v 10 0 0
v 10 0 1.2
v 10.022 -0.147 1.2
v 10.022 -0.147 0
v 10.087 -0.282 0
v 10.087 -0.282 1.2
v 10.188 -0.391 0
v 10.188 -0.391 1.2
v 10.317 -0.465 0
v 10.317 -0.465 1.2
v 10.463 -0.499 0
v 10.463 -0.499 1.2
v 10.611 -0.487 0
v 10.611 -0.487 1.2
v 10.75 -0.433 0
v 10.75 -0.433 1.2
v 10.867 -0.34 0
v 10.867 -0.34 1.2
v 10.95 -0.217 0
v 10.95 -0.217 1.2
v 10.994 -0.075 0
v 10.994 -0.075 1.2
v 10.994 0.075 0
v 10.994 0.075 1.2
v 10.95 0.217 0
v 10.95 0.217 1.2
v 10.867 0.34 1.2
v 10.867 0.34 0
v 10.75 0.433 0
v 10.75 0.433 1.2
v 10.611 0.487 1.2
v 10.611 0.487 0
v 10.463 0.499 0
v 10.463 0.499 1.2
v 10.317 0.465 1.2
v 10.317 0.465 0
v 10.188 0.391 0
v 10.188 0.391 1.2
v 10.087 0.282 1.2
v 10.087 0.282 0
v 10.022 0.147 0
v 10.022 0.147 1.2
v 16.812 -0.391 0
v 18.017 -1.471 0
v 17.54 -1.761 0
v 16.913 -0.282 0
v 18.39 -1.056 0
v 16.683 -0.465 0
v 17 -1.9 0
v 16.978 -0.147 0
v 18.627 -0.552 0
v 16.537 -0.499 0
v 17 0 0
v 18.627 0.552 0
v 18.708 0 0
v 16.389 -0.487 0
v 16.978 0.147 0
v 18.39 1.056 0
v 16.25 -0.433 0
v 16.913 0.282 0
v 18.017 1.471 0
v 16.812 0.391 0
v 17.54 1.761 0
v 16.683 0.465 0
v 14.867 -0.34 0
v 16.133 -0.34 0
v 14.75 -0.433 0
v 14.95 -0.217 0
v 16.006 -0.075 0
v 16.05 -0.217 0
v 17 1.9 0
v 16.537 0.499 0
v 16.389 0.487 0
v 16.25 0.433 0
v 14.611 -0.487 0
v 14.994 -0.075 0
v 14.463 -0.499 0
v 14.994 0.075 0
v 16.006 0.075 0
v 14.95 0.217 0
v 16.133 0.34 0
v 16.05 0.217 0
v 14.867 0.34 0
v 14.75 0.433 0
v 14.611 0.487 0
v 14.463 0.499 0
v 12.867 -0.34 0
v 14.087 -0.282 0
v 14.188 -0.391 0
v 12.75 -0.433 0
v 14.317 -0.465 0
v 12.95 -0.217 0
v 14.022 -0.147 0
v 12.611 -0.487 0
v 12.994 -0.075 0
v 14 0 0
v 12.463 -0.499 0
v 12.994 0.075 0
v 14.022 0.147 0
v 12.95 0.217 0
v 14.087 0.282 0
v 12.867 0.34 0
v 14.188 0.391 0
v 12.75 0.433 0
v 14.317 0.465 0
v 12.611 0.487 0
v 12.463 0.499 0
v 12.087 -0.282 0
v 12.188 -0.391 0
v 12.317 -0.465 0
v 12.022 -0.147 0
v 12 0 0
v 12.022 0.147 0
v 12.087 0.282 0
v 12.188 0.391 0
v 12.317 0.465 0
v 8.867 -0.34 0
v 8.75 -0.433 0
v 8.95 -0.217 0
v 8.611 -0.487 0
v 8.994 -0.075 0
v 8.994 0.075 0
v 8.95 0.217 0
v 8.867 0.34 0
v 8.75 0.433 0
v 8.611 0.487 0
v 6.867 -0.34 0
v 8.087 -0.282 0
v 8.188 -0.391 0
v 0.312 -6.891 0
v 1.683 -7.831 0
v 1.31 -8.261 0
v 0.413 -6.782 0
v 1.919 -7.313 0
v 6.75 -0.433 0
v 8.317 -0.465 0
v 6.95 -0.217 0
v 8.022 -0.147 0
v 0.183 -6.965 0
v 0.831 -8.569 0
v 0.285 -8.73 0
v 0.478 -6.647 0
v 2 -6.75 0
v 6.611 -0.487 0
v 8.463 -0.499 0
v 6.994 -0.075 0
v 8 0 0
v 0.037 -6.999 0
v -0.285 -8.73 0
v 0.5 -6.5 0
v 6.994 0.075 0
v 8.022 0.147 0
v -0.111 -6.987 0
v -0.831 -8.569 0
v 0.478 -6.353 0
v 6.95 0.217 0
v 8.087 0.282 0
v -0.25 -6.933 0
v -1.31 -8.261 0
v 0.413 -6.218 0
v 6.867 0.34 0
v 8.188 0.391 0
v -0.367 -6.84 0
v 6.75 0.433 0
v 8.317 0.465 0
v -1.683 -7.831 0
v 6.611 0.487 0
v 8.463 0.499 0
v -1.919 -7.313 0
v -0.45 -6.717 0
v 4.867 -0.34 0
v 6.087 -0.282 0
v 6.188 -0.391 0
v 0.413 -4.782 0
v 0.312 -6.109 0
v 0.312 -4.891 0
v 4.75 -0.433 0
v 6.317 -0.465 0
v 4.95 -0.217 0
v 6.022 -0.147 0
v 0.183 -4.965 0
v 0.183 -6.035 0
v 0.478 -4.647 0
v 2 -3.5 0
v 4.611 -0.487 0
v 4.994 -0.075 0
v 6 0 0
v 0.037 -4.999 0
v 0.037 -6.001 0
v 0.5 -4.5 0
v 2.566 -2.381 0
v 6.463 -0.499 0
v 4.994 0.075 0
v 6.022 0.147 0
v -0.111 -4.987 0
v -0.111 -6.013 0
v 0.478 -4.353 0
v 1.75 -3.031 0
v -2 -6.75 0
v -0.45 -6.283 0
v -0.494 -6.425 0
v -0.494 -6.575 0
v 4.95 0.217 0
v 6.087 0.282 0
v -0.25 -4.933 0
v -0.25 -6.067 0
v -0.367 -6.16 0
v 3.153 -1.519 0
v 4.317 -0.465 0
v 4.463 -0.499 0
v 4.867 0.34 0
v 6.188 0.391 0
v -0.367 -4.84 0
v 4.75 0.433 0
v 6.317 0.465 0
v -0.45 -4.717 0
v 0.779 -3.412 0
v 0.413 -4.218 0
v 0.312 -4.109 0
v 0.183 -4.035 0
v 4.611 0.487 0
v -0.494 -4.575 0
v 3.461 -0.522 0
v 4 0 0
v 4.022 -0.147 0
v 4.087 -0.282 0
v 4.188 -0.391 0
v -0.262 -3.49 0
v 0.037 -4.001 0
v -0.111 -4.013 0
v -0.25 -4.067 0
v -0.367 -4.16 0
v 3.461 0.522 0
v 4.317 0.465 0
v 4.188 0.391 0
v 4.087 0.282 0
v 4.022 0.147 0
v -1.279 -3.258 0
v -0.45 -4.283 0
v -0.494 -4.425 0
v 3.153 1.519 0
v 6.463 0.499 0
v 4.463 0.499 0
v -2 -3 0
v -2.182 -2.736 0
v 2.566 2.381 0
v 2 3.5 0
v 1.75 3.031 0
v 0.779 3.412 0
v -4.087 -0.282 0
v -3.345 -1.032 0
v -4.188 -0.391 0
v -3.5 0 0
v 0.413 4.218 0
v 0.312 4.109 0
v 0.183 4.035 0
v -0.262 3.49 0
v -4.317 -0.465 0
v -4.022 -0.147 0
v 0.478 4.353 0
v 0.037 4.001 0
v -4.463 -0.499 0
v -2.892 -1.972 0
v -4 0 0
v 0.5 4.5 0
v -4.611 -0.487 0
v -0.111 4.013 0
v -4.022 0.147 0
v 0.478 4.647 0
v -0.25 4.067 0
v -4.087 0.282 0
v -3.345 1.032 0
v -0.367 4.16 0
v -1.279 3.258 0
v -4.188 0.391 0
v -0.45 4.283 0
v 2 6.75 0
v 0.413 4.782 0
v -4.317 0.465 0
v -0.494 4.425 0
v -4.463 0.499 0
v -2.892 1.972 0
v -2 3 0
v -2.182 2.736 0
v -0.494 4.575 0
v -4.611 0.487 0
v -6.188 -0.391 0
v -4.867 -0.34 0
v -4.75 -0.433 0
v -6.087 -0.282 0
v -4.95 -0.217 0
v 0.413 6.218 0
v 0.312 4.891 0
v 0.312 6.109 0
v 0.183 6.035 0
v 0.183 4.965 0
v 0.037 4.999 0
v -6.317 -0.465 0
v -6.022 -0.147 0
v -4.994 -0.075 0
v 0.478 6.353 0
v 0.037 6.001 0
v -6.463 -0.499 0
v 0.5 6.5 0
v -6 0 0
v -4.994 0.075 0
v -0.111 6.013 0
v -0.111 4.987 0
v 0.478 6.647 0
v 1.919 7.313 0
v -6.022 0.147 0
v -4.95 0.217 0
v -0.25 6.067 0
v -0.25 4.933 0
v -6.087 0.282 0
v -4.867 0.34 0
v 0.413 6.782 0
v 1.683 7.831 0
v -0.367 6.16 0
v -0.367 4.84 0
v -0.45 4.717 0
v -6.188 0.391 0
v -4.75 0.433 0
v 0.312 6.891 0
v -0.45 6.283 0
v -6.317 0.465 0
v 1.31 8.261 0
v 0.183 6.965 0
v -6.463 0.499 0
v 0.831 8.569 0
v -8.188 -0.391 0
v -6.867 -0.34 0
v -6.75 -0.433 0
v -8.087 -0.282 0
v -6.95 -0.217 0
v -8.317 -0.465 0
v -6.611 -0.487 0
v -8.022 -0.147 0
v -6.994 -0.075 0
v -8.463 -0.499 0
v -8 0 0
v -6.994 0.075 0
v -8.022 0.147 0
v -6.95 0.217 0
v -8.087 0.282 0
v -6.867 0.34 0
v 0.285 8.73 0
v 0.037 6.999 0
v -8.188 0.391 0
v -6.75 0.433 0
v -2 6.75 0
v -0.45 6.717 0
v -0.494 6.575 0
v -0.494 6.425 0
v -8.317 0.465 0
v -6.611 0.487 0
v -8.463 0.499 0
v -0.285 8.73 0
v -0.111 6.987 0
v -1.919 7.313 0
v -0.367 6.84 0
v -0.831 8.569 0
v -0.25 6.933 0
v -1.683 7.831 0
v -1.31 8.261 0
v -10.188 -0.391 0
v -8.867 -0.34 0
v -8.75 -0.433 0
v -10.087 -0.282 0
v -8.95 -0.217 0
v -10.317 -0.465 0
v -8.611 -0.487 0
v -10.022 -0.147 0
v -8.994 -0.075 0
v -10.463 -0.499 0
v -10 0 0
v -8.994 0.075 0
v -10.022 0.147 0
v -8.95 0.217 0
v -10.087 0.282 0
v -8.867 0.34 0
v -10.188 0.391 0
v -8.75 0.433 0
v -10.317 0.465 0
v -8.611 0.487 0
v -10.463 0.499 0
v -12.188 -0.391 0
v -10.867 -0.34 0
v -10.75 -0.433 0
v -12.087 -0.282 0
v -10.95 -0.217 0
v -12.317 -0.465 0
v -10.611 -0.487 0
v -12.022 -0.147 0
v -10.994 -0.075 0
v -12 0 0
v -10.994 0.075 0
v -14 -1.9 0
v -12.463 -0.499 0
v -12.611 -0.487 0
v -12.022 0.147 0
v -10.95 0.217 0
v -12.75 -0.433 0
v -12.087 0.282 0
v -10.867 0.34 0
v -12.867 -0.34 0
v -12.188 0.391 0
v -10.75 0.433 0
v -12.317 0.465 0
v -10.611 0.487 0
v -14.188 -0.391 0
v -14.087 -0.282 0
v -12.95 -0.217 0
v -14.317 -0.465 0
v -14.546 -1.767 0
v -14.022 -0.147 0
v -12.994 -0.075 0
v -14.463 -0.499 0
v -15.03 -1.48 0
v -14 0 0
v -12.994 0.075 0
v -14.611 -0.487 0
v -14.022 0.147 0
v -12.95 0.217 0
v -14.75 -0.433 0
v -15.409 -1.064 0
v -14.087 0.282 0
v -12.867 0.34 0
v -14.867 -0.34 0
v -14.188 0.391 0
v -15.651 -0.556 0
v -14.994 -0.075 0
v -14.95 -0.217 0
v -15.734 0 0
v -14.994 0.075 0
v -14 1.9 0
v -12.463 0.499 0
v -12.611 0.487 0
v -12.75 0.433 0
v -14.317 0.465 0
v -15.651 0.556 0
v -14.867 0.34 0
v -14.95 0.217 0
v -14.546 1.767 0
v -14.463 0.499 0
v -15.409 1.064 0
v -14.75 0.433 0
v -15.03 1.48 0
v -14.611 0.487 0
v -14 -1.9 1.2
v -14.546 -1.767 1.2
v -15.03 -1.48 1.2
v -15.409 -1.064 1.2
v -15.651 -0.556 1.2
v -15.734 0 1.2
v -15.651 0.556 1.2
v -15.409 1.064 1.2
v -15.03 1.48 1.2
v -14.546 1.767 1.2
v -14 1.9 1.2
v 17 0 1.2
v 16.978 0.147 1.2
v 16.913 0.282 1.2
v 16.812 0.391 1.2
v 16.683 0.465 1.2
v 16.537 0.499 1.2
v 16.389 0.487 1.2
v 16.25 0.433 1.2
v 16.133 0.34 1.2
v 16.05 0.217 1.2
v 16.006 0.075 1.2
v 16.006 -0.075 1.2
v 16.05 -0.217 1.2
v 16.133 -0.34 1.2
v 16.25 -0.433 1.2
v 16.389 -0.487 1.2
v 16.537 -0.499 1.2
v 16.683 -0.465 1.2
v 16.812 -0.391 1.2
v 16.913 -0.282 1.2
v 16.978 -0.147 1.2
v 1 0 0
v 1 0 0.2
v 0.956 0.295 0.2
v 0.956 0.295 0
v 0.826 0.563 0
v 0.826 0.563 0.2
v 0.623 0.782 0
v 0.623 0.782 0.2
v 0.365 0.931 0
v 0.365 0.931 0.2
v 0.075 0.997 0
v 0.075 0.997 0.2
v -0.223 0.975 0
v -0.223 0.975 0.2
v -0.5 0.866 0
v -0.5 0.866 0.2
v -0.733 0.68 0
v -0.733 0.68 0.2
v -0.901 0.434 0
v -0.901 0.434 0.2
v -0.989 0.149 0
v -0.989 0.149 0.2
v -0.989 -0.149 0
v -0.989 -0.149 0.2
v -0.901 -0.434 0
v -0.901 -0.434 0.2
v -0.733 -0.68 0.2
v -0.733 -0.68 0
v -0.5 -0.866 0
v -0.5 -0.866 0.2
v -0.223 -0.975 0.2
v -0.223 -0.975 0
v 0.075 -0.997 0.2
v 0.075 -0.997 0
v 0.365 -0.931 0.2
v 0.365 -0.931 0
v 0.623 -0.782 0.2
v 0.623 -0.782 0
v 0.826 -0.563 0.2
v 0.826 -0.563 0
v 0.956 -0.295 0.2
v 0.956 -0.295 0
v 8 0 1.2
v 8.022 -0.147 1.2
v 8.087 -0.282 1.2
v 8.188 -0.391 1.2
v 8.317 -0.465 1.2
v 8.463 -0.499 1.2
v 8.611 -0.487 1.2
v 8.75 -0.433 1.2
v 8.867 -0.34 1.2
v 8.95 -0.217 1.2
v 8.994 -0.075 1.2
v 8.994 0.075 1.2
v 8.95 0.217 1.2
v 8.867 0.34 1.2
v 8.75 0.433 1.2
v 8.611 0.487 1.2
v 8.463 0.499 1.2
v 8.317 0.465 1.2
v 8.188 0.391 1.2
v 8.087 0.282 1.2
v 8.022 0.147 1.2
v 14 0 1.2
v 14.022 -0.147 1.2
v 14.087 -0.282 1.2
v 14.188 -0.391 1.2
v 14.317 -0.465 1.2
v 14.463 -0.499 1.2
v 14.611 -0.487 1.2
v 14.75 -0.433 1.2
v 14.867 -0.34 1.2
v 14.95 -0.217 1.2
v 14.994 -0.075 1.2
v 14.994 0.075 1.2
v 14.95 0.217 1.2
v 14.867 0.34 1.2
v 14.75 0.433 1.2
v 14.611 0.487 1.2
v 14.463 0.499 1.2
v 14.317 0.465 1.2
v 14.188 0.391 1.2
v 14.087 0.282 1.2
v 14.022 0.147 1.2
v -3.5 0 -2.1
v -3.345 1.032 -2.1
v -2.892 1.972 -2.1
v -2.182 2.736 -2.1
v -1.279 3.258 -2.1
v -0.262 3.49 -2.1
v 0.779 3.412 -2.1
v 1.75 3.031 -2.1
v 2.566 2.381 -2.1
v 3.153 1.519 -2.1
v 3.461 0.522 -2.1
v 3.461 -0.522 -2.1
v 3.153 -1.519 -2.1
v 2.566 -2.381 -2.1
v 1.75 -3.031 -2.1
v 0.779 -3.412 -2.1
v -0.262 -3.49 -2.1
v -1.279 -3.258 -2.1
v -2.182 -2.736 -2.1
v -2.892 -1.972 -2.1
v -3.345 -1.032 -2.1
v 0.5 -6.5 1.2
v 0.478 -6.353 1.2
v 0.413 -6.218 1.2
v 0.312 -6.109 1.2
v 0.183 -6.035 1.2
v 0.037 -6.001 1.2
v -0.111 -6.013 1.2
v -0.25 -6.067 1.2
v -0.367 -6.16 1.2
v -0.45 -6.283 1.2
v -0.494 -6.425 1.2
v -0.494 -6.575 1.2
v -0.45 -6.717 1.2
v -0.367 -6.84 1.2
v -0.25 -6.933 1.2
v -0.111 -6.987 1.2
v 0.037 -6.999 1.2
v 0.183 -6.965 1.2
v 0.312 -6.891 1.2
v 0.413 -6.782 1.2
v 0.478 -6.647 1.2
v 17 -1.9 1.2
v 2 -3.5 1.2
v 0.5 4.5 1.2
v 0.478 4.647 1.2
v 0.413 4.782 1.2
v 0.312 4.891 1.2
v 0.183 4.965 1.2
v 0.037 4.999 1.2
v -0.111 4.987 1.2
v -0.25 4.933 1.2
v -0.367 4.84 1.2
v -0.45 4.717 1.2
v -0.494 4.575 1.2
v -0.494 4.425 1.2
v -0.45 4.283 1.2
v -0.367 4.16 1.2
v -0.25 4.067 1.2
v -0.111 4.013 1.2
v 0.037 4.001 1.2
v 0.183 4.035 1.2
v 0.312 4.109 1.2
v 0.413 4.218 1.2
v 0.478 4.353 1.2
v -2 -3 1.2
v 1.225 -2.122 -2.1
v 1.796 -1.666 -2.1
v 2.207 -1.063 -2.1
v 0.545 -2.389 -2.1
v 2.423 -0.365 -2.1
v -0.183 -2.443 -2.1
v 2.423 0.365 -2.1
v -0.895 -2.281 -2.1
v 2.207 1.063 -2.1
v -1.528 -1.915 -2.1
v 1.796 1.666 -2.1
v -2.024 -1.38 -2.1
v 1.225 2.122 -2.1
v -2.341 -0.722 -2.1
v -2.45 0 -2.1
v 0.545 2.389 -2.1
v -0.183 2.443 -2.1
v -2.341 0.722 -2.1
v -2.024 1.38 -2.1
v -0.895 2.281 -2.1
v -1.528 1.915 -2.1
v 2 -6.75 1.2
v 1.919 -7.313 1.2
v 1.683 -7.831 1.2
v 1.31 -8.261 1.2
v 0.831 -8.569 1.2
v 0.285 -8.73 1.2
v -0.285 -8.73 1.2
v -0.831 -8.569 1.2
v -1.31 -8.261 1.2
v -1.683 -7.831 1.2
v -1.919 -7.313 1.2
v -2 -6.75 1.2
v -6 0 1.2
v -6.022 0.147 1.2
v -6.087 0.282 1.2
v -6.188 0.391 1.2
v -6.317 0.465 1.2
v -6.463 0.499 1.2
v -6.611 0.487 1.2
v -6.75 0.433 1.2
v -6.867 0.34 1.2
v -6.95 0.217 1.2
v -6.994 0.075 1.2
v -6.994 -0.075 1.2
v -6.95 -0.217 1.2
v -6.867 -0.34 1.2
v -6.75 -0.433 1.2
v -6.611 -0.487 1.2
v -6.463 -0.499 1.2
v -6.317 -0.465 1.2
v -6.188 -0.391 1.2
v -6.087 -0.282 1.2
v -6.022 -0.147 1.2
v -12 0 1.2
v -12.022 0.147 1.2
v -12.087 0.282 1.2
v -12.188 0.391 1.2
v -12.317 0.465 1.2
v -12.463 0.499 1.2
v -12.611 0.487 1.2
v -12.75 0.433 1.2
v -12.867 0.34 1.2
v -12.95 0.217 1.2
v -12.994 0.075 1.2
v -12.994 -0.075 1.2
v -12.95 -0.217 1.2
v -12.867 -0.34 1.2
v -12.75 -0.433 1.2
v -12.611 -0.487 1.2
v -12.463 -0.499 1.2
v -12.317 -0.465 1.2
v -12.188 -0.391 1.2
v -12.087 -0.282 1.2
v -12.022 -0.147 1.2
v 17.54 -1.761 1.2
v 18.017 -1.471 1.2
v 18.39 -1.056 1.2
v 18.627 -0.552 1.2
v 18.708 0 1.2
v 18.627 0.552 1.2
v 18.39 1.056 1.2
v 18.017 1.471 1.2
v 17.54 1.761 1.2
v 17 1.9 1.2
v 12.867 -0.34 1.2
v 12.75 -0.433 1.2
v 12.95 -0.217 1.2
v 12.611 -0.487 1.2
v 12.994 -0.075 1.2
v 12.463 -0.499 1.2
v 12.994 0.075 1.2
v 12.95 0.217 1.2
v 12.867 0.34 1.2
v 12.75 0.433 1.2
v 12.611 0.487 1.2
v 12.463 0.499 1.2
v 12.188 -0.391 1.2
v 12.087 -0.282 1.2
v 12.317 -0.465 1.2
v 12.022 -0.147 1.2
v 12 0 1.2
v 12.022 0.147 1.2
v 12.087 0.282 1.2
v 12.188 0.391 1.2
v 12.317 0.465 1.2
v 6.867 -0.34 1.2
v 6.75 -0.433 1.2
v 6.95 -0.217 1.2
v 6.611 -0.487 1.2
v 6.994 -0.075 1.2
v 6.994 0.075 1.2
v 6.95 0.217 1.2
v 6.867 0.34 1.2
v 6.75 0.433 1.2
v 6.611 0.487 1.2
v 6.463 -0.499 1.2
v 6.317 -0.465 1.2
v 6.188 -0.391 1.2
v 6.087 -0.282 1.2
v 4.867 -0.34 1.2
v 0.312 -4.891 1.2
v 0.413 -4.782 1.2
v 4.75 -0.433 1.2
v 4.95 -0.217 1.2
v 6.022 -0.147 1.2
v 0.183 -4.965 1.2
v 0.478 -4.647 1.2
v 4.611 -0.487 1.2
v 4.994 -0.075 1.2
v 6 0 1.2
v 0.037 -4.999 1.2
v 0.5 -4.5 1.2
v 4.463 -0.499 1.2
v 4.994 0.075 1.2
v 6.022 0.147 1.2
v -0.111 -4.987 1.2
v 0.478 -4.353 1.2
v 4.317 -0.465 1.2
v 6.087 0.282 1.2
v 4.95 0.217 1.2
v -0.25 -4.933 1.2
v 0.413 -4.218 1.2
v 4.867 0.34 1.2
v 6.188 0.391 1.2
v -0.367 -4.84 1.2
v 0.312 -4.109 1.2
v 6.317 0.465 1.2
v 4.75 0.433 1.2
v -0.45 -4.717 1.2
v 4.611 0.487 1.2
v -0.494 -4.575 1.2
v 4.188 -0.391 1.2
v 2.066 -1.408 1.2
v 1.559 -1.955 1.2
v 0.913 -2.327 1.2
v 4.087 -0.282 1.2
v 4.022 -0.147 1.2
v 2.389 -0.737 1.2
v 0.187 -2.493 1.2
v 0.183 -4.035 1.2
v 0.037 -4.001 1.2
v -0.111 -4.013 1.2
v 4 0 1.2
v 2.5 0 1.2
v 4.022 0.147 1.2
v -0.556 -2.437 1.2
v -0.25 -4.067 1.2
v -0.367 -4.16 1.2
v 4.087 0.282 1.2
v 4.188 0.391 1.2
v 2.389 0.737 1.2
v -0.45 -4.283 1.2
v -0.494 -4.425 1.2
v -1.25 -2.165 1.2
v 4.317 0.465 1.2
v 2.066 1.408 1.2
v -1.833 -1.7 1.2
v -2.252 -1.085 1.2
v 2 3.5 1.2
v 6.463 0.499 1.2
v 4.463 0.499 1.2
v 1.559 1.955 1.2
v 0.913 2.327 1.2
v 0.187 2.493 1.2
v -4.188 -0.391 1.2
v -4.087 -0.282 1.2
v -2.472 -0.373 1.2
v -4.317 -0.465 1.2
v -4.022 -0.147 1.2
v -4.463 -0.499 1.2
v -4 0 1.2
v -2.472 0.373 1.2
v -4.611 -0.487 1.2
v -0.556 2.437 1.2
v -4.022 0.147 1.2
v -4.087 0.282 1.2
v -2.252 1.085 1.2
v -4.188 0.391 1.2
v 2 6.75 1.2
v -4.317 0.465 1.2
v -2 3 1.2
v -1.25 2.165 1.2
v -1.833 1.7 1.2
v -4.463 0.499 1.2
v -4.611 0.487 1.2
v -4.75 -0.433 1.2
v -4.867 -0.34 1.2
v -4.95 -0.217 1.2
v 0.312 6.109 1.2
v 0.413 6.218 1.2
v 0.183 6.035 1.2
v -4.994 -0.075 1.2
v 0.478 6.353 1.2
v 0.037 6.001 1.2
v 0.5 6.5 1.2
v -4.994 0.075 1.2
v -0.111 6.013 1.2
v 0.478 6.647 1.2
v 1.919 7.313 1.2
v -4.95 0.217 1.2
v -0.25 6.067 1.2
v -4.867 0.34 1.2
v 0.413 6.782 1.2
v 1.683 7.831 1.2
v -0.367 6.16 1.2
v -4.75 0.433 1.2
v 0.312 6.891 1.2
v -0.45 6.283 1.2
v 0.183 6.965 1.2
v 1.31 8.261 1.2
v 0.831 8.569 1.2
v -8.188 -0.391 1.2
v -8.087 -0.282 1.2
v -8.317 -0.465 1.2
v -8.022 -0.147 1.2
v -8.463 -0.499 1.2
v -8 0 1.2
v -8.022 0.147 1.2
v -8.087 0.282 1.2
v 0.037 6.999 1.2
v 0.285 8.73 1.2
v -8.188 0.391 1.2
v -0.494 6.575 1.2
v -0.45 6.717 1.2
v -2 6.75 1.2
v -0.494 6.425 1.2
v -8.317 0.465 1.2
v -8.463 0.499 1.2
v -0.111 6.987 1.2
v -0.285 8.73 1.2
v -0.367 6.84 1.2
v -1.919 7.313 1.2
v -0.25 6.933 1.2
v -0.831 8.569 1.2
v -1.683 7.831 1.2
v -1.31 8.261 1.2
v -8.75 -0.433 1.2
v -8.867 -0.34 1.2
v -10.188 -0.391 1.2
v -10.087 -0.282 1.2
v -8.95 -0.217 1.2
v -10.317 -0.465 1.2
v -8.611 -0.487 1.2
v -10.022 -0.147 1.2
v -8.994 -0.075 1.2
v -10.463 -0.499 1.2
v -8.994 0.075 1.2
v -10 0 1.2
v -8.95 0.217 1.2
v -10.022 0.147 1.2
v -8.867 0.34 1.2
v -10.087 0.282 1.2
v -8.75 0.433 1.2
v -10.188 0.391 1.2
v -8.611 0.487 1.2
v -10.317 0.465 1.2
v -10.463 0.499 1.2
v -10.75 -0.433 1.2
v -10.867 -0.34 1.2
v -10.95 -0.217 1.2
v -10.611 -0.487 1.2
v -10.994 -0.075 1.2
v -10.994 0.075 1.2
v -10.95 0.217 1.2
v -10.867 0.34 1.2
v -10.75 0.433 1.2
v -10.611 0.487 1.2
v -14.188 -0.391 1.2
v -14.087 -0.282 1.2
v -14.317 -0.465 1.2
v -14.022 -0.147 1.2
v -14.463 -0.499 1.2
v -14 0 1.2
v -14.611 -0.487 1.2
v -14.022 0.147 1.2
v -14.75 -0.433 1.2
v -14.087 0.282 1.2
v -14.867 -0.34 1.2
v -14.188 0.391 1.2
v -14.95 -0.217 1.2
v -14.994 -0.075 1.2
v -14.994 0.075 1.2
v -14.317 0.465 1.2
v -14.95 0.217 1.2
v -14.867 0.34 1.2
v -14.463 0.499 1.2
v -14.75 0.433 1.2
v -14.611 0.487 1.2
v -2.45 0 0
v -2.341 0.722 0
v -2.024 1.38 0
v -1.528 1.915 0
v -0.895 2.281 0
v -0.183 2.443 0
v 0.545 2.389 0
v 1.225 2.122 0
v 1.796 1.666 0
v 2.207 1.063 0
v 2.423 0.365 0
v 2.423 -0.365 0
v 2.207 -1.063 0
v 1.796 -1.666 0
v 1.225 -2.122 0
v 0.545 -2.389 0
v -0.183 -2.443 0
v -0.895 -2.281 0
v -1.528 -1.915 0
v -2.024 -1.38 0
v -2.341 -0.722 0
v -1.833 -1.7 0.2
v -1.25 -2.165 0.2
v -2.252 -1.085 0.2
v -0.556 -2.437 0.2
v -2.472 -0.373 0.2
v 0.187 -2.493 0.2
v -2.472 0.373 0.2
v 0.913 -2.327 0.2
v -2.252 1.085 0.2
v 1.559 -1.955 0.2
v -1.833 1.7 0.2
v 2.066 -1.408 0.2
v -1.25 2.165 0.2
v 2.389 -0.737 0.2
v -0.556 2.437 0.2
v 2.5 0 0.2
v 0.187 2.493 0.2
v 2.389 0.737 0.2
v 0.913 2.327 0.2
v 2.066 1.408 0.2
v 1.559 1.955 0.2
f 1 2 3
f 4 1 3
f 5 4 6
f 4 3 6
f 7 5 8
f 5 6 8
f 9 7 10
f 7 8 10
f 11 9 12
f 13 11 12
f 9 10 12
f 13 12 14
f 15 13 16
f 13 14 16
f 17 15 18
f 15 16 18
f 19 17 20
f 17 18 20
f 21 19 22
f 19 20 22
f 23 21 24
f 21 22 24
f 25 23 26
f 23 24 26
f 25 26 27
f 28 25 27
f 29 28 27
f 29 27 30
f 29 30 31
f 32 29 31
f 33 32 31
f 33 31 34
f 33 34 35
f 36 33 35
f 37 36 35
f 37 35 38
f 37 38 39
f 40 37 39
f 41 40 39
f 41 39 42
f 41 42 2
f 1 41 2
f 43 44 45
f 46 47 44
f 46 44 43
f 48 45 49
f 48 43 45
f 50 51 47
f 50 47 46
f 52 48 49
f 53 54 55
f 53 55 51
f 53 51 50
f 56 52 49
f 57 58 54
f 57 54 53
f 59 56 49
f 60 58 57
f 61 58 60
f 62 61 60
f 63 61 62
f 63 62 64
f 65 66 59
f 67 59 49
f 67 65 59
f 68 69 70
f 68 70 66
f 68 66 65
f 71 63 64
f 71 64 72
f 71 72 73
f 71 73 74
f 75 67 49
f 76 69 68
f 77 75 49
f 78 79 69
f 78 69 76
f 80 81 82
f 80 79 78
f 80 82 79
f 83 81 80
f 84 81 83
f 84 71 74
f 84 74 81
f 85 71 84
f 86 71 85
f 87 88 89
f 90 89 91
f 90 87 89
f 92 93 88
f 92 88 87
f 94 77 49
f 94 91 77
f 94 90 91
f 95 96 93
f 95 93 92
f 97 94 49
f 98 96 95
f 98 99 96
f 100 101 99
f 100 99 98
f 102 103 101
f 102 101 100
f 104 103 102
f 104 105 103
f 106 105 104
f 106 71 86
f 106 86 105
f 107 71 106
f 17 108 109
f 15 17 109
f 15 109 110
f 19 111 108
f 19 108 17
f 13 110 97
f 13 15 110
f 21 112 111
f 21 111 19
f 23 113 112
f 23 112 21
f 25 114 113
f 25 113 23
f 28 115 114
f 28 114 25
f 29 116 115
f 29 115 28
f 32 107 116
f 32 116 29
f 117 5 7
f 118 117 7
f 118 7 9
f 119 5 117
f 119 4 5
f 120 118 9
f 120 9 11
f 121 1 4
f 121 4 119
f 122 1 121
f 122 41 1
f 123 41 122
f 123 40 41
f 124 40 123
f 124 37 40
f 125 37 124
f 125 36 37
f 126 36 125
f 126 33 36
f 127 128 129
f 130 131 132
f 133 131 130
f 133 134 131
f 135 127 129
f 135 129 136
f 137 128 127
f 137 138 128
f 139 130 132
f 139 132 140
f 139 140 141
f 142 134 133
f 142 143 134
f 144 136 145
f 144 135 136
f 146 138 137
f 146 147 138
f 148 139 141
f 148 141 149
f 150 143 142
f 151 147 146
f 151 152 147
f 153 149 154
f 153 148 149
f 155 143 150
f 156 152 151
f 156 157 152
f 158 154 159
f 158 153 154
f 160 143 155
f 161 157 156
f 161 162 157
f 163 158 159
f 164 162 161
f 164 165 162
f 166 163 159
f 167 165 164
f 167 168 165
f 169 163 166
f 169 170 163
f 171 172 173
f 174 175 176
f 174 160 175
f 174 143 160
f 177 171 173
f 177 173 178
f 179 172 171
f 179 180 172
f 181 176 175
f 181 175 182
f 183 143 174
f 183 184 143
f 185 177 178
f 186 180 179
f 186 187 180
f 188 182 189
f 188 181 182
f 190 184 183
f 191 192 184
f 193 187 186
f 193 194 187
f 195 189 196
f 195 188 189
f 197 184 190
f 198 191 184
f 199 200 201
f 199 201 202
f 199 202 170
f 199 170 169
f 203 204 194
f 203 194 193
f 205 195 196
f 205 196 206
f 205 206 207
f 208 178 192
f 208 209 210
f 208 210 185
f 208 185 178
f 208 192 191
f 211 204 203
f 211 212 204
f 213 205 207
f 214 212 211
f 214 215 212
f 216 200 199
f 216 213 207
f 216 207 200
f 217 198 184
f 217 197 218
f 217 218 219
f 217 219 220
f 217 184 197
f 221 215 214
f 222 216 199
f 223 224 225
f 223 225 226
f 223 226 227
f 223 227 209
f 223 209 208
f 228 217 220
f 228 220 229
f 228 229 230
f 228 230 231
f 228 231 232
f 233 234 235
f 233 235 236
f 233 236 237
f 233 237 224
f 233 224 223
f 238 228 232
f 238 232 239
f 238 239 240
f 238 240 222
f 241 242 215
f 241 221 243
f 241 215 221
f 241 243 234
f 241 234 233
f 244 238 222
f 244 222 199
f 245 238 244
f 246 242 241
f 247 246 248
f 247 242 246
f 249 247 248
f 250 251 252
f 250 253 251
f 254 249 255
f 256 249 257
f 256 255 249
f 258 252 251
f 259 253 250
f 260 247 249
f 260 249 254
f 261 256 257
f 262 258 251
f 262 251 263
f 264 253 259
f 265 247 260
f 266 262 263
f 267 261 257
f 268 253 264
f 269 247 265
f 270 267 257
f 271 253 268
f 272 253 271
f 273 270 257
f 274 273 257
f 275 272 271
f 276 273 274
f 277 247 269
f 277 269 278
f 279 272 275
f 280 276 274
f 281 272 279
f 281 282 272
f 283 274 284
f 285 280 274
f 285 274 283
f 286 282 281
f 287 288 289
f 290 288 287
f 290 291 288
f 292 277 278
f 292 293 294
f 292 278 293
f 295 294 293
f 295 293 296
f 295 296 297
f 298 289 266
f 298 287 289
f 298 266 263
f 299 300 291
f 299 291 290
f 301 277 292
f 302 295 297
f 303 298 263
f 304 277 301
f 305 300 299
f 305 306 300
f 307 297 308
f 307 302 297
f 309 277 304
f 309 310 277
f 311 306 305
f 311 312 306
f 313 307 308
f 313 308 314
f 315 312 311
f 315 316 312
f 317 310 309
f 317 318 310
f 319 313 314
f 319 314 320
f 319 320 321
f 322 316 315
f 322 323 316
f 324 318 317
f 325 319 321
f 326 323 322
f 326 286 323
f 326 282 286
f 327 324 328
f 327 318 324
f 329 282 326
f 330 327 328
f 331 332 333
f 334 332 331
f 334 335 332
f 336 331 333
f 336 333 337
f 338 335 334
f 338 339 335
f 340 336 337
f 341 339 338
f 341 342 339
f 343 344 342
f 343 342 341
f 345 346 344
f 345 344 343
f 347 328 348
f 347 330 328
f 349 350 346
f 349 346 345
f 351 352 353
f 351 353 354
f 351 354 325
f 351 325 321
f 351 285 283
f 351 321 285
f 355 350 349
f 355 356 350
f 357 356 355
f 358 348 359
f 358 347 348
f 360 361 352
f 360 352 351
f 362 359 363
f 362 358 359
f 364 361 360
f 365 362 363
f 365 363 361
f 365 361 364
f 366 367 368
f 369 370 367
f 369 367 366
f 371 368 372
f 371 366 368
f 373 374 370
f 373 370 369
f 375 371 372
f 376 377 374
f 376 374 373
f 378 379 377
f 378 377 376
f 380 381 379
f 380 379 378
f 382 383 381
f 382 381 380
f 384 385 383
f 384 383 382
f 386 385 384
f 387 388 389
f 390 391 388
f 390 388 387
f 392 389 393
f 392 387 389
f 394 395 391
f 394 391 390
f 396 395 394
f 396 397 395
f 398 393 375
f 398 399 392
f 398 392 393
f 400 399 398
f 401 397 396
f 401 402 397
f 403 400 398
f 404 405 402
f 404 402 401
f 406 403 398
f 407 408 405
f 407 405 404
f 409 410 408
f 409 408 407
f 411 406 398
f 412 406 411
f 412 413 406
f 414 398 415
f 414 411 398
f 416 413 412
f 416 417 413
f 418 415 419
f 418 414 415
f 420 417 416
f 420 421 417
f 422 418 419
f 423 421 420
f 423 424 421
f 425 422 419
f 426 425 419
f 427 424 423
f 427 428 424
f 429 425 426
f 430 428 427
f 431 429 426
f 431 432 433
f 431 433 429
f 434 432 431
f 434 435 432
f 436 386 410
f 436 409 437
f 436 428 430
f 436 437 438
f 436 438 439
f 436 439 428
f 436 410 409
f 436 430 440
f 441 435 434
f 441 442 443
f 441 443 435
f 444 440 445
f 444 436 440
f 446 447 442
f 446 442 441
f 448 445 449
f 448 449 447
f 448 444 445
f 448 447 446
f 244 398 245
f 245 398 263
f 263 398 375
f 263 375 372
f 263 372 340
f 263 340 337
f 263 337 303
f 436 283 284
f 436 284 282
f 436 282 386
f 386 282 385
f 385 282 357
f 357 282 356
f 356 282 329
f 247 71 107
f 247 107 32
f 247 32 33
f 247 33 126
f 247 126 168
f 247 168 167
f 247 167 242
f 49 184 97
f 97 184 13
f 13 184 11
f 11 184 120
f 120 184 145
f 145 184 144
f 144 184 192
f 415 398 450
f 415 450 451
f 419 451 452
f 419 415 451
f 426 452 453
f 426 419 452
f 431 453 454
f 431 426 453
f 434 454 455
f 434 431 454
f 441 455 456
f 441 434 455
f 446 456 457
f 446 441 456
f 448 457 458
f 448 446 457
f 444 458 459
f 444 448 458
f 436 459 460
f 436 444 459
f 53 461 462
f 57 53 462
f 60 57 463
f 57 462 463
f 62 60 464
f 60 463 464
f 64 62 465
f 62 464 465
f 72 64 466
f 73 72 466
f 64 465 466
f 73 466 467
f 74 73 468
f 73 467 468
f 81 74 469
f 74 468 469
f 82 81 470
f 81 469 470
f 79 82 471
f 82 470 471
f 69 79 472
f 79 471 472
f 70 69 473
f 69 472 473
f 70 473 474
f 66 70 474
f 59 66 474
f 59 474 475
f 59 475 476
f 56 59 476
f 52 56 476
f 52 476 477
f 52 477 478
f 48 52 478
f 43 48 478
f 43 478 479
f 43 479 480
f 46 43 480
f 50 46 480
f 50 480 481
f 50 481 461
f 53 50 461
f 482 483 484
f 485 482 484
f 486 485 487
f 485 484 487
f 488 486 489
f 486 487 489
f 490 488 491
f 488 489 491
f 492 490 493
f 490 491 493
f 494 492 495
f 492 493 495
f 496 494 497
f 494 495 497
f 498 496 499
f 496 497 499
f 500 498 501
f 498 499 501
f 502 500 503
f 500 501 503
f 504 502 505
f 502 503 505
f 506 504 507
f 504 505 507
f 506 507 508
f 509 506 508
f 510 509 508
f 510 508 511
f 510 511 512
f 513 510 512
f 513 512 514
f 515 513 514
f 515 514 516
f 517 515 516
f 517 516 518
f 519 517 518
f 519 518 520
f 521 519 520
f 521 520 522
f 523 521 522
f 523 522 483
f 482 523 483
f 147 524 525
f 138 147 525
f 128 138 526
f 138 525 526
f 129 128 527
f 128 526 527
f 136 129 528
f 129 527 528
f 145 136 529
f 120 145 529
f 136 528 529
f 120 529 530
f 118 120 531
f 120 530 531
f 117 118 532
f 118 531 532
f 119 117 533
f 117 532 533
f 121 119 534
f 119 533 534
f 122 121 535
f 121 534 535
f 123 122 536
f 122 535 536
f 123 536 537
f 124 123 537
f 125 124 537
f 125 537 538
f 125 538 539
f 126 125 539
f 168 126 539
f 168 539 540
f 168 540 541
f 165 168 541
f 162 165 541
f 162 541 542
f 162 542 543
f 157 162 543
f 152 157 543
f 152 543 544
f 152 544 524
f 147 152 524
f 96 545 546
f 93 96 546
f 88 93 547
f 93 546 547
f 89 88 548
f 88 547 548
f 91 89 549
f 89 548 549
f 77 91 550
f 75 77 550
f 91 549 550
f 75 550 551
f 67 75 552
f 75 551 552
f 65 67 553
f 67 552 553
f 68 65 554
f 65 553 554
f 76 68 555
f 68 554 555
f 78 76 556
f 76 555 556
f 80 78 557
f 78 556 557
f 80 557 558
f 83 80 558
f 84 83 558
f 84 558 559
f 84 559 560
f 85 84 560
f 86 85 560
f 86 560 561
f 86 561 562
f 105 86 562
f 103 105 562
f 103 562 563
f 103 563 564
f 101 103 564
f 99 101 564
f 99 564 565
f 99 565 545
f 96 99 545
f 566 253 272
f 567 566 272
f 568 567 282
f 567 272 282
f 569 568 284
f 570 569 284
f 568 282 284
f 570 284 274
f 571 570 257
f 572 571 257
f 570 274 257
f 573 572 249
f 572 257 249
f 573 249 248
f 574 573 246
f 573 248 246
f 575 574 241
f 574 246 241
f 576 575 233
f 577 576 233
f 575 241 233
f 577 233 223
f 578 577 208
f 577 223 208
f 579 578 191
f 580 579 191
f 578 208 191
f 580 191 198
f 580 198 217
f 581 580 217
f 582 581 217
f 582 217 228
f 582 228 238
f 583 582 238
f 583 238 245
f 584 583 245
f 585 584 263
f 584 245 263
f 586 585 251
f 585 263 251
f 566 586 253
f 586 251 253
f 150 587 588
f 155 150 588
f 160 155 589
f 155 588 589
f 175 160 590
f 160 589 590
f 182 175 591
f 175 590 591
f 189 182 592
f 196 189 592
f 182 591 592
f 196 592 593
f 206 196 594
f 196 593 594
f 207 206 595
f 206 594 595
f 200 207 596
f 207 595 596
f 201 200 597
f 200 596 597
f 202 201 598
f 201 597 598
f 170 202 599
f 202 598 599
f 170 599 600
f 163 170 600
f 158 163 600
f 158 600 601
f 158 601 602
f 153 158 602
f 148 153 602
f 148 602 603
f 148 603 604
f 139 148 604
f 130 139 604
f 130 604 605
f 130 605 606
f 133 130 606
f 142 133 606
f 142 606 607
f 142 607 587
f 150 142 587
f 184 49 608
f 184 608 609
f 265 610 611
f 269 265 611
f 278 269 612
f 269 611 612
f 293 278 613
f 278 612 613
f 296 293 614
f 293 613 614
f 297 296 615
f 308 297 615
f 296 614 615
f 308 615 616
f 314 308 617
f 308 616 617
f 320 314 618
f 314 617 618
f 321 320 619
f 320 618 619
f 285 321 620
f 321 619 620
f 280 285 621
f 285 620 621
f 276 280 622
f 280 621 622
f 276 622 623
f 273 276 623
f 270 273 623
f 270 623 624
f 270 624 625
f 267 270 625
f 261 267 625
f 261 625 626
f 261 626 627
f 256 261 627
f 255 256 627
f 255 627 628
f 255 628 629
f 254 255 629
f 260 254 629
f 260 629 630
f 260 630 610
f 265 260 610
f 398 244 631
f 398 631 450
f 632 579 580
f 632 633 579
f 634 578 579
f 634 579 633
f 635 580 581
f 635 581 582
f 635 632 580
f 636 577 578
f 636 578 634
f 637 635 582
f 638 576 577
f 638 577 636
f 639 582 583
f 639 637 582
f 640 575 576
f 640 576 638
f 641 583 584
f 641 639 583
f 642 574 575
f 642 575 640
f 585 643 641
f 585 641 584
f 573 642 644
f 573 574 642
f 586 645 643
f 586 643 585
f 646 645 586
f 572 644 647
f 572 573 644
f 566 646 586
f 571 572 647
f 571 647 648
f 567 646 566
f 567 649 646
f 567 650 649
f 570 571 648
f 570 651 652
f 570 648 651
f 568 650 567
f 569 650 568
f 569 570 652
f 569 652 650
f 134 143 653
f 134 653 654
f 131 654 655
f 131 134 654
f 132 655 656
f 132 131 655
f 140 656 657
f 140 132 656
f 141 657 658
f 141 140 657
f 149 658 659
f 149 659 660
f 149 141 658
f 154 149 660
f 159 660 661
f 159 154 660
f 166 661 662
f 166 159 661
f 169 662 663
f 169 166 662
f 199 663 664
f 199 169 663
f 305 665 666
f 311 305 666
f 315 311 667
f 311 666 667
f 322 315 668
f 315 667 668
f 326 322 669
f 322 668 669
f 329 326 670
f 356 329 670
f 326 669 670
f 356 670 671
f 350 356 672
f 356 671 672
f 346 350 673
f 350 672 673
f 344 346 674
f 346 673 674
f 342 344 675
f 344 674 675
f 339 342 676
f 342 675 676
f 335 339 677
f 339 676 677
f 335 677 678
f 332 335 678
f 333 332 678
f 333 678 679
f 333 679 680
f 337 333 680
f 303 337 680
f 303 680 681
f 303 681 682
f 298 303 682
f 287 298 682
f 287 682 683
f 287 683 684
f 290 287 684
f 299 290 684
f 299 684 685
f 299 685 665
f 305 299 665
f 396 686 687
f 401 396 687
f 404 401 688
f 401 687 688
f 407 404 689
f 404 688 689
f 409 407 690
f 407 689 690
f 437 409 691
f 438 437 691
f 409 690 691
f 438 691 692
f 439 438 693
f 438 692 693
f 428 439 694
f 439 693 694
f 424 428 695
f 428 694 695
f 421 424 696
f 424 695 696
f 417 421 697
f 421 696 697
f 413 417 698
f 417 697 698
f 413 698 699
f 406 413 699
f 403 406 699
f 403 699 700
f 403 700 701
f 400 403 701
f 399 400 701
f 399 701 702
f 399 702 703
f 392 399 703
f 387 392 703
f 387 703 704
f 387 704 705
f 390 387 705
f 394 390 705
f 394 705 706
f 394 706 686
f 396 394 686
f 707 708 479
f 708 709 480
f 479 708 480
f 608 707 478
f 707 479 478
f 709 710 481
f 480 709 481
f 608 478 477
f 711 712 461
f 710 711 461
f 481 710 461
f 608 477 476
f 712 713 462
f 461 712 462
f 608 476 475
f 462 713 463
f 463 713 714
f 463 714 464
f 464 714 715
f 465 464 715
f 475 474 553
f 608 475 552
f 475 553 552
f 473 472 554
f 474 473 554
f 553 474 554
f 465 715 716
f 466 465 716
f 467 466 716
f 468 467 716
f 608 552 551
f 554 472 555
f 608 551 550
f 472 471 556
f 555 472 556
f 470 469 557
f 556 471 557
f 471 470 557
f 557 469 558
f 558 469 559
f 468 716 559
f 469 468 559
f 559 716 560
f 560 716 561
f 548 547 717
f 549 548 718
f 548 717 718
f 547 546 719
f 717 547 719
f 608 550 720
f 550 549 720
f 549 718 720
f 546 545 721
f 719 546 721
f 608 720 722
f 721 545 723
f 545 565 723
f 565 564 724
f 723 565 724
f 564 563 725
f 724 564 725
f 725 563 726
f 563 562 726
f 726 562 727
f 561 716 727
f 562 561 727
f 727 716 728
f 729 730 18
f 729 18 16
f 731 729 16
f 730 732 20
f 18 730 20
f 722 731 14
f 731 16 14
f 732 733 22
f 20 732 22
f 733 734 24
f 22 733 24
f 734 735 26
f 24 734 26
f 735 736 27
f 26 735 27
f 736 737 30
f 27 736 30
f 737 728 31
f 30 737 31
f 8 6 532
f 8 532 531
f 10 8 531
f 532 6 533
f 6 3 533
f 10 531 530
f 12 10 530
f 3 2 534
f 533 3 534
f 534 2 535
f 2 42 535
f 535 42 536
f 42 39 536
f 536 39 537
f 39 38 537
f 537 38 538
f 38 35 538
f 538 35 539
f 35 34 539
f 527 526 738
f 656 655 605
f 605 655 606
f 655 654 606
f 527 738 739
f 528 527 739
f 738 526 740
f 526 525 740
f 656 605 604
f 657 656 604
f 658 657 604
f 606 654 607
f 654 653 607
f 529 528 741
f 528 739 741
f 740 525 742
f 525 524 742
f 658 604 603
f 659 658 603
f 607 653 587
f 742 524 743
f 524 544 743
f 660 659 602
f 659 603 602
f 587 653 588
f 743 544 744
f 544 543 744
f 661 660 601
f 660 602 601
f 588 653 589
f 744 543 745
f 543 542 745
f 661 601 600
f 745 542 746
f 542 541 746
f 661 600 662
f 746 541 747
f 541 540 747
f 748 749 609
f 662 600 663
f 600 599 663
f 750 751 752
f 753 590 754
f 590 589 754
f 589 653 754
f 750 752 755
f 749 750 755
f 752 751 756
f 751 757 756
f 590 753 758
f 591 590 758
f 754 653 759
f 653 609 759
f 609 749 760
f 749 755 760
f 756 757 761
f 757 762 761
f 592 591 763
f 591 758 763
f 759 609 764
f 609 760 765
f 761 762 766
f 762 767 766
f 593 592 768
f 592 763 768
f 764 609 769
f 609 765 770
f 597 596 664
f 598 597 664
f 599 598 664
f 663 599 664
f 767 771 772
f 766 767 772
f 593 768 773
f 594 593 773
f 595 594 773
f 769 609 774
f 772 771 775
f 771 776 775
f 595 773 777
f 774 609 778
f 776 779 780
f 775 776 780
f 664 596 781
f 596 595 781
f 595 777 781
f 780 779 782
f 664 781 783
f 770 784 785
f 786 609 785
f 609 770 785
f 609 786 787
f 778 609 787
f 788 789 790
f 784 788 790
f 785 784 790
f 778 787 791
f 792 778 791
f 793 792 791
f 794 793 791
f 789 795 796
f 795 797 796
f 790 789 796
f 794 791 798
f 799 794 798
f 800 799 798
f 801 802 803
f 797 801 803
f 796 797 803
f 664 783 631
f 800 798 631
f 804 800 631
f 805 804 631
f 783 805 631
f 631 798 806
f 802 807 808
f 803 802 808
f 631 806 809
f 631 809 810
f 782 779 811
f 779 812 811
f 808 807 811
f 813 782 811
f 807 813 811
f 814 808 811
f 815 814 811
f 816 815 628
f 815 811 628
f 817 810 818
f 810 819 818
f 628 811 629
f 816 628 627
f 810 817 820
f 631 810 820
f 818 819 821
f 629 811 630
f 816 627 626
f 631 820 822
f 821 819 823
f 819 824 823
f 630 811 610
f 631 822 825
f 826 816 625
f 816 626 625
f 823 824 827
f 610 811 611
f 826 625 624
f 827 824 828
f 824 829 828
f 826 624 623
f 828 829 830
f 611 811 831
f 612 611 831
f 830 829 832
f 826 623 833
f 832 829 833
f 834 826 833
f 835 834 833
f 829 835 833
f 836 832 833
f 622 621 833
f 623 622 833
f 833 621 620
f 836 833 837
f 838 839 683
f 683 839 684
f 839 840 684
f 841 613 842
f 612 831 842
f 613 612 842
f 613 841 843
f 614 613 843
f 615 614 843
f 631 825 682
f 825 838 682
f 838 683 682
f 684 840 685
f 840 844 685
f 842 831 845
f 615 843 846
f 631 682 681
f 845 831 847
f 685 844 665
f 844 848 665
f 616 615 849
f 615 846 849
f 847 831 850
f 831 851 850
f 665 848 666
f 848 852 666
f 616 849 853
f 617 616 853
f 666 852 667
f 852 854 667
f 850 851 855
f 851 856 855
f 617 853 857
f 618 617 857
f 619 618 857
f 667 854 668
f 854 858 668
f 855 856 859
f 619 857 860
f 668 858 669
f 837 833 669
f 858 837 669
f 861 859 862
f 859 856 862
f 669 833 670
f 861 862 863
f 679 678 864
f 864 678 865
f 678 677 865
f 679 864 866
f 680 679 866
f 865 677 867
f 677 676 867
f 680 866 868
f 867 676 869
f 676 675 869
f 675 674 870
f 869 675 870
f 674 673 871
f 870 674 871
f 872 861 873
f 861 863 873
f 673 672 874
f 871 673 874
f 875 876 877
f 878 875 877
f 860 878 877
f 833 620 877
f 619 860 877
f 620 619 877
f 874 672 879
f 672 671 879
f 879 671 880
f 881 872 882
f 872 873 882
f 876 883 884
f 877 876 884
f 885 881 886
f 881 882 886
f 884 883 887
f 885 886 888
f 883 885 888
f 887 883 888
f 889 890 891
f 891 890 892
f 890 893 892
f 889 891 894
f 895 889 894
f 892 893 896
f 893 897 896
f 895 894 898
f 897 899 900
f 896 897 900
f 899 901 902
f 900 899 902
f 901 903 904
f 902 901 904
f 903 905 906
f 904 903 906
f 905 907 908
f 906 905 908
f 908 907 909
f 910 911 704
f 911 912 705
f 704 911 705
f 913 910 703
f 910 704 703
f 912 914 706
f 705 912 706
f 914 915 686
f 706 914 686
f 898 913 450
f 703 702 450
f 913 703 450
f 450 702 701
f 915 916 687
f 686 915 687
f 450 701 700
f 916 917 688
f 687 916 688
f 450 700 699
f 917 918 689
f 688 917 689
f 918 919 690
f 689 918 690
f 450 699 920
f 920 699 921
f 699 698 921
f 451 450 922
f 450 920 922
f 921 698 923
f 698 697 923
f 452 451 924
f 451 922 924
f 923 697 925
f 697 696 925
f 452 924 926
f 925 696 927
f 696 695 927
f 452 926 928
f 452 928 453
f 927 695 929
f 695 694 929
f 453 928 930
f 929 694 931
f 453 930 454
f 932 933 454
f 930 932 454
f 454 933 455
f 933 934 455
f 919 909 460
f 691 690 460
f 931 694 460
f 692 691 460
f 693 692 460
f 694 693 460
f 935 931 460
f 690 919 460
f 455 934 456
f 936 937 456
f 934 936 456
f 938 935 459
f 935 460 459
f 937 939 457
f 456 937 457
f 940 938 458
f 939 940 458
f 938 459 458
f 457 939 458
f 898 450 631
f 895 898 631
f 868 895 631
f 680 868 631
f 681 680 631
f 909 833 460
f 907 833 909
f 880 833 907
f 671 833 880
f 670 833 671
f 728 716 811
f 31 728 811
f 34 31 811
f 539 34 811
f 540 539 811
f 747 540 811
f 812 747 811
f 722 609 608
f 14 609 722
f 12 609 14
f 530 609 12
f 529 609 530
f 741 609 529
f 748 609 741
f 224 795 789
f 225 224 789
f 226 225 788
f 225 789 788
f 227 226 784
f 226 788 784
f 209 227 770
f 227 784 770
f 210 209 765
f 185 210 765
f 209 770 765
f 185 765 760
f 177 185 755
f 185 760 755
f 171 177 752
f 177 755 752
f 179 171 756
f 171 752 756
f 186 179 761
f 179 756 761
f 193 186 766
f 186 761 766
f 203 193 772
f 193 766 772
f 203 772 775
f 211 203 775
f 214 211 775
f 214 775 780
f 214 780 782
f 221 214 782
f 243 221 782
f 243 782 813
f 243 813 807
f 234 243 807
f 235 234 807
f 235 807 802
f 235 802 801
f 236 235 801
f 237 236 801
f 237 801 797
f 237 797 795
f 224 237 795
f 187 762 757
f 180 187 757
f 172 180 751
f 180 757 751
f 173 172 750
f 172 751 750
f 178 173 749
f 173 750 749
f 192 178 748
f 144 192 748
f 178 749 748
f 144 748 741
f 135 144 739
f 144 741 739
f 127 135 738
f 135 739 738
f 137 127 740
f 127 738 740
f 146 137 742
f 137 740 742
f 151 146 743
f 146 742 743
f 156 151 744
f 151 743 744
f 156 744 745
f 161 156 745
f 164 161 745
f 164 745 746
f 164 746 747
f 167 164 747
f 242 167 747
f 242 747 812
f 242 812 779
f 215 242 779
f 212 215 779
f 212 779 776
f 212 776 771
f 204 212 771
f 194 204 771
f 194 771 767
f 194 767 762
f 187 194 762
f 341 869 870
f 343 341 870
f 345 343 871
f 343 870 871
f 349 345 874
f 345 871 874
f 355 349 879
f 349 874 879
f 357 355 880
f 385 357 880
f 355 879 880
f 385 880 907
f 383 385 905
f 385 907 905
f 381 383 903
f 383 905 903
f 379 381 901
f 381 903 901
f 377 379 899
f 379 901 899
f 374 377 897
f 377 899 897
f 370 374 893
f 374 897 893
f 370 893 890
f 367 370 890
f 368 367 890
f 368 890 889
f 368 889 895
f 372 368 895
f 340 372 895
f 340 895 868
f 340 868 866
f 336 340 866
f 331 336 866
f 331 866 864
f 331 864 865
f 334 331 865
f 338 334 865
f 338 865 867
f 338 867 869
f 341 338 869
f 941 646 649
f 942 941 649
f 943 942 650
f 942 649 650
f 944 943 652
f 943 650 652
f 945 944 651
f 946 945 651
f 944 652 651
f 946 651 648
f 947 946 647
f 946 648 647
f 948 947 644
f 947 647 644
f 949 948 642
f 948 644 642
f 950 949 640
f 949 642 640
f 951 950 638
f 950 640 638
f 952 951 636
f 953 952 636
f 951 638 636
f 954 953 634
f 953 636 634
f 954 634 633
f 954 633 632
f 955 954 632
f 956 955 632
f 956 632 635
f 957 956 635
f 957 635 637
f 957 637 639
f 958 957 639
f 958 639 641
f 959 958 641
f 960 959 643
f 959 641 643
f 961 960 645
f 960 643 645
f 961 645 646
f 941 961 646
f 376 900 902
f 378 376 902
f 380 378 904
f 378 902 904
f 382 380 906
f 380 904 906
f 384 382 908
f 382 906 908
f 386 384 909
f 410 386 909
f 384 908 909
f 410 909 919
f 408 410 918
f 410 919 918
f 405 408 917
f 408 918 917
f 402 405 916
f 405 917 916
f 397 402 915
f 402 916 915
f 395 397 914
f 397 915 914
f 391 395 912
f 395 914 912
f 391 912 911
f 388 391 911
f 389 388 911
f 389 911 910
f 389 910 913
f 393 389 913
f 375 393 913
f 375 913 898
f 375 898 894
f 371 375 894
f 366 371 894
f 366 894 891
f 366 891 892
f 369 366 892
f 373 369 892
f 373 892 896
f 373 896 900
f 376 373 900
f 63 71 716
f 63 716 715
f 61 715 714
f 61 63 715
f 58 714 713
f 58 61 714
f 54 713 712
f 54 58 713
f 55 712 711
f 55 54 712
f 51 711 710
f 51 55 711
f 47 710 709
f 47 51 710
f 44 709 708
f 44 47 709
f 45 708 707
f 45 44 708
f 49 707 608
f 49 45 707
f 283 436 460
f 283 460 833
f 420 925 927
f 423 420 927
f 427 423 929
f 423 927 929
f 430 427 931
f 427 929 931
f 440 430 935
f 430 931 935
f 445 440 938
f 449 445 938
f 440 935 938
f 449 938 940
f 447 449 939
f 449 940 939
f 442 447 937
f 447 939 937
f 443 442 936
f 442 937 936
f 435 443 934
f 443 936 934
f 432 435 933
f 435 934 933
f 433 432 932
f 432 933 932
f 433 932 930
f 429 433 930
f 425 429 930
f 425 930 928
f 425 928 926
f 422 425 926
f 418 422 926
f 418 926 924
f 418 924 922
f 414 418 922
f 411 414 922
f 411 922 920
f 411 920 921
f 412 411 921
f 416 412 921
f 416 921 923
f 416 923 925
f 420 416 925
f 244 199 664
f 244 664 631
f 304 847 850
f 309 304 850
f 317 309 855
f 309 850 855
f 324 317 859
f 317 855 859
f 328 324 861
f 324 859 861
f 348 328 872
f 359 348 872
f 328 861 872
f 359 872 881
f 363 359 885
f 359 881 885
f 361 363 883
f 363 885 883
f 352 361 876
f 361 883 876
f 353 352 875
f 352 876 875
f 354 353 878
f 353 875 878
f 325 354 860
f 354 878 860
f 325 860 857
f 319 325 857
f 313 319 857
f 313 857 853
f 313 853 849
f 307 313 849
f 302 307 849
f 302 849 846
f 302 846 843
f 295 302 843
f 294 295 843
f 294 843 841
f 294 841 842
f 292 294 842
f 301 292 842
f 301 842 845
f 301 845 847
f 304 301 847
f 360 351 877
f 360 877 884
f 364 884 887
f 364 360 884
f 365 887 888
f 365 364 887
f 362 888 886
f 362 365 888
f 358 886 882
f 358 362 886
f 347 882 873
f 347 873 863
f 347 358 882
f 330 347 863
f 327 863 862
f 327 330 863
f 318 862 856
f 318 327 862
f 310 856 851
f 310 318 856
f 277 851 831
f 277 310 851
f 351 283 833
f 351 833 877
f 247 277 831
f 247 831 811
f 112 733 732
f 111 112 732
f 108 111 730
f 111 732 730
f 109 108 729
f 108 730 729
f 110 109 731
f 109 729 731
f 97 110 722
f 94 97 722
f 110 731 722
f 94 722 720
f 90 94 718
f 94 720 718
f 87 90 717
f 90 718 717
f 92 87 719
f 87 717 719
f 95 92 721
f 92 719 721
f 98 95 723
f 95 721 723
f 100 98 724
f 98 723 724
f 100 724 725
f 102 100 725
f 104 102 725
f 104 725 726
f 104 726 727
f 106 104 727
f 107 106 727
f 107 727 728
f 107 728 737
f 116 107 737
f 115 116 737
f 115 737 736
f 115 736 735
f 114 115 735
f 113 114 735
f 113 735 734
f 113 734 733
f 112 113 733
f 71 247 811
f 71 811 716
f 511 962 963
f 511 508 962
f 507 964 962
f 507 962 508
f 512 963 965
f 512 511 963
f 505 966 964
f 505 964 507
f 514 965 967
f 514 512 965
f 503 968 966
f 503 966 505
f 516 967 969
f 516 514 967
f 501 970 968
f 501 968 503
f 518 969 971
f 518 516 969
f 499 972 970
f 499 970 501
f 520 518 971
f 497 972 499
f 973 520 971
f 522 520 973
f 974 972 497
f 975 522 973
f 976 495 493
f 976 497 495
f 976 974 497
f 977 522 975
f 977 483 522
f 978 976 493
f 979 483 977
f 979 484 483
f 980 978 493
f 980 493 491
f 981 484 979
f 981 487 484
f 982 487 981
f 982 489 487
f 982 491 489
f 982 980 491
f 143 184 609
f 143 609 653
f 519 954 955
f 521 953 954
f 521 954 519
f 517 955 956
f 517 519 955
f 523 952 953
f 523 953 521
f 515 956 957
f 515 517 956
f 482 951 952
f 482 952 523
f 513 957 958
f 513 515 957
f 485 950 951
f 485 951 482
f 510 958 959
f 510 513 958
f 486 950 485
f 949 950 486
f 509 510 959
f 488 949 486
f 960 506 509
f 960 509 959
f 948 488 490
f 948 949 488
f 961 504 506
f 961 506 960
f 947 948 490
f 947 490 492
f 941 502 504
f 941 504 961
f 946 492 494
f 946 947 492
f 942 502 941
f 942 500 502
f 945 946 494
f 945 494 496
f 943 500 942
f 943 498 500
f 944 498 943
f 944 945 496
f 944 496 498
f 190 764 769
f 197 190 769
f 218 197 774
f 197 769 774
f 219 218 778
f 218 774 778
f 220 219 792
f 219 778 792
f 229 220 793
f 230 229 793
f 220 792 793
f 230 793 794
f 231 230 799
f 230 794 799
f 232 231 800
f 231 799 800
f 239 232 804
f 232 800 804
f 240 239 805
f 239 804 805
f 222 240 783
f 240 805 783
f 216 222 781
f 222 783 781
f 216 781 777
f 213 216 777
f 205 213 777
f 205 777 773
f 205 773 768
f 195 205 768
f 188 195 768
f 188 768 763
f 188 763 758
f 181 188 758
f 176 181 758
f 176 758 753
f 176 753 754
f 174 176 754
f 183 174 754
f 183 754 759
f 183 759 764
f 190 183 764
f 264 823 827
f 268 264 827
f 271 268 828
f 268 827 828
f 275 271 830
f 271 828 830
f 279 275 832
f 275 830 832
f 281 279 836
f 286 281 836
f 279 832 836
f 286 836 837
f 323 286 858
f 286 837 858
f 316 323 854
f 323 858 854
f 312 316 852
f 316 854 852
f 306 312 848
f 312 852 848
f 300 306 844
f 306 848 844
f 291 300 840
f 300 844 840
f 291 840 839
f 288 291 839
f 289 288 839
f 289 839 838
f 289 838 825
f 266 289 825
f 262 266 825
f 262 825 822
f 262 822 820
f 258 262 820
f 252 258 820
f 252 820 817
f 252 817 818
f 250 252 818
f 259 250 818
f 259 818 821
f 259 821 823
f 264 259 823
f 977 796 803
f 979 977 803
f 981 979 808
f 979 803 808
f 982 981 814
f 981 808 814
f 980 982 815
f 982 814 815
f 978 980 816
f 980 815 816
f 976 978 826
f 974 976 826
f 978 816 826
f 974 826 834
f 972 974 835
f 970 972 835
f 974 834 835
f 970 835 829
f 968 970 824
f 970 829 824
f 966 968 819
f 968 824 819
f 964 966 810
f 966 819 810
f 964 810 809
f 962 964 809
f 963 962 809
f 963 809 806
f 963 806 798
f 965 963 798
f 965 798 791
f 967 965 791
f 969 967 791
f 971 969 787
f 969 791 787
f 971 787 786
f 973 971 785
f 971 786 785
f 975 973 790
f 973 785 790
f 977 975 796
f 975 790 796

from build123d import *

# Parameters (mm, degrees)
BOSS_EXTRUDE1_DEPTH = 1.2
SKETCH2_R           = 3.5
BOSS_EXTRUDE2_DEPTH = 2.1
SKETCH3_R           = 2.5
CUT_EXTRUDE1_DEPTH  = 1
SKETCH4_R           = 1
CUT_EXTRUDE2_DEPTH  = 21.78090329
SKETCH6_R           = 2.45
CUT_EXTRUDE3_DEPTH  = 2.1
SKETCH7_R           = 0.5
CUT_EXTRUDE4_DEPTH  = 21.915208379
SKETCH8_R           = 0.5
CUT_EXTRUDE5_DEPTH  = 21.915208379


with BuildPart() as part:
    # Sketch1 → Boss-Extrude1 (new body)
    with BuildSketch(Plane.XY):
        with BuildLine():
            Line((-2, -6.75), (-2, -3))
            Line((-2, -3), (-14, -1.9))
            ThreePointArc((-14, -1.9), (-15.733799273, 0), (-14, 1.9))
            Line((-14, 1.9), (-2, 3))
            Line((-2, 3), (-2, 6.75))
            ThreePointArc((-2, 6.75), (0, 8.75), (2, 6.75))
            Line((2, 6.75), (2, 3.5))
            Line((2, 3.5), (17, 1.9))
            ThreePointArc((17, 1.9), (18.708111651, 0), (17, -1.9))
            Line((17, -1.9), (2, -3.5))
            Line((2, -3.5), (2, -6.75))
            ThreePointArc((2, -6.75), (0, -8.75), (-2, -6.75))
        make_face()
    extrude(amount=BOSS_EXTRUDE1_DEPTH)

    # Sketch2 → Boss-Extrude2 (add)
    with BuildSketch(Plane(origin=(0, 0, 0), x_dir=(-1, 0, 0), z_dir=(0, 0, -1))):
        Circle(SKETCH2_R)
    extrude(amount=BOSS_EXTRUDE2_DEPTH)

    # Sketch3 → Cut-Extrude1 (cut)
    with BuildSketch(Plane.XY.offset(1.2)):
        Circle(SKETCH3_R)
    extrude(amount=-CUT_EXTRUDE1_DEPTH, mode=Mode.SUBTRACT)

    # Sketch4 → Cut-Extrude2 (cut, through all)
    with BuildSketch(Plane.XY.offset(0.2)):
        Circle(SKETCH4_R)
    extrude(amount=-CUT_EXTRUDE2_DEPTH, mode=Mode.SUBTRACT)

    # Sketch6 → Cut-Extrude3 (cut)
    with BuildSketch(Plane(origin=(0, 0, -2.1), x_dir=(-1, 0, 0), z_dir=(0, 0, -1))):
        Circle(SKETCH6_R)
    extrude(amount=-CUT_EXTRUDE3_DEPTH, mode=Mode.SUBTRACT)

    # Sketch7 → Cut-Extrude4 (cut, through all)
    with BuildSketch(Plane.XY.offset(1.2)):
        with Locations((0, -4.5)):
            Circle(SKETCH7_R)
        with Locations((0, -6.5)):
            Circle(SKETCH7_R)
        with Locations((0, 4.5)):
            Circle(SKETCH7_R)
        with Locations((0, 6.5)):
            Circle(SKETCH7_R)
    extrude(amount=-CUT_EXTRUDE4_DEPTH, mode=Mode.SUBTRACT)

    # Sketch8 → Cut-Extrude5 (cut, through all)
    with BuildSketch(Plane.XY.offset(1.2)):
        with Locations((-4.5, 0)):
            Circle(SKETCH8_R)
        with Locations((-6.5, 0)):
            Circle(SKETCH8_R)
        with Locations((-8.5, 0)):
            Circle(SKETCH8_R)
        with Locations((-10.5, 0)):
            Circle(SKETCH8_R)
        with Locations((-12.5, 0)):
            Circle(SKETCH8_R)
        with Locations((-14.5, 0)):
            Circle(SKETCH8_R)
        with Locations(Location((4.5, 0, 0), (0, 0, 180))):
            Circle(SKETCH8_R)
        with Locations(Location((6.5, 0, 0), (0, 0, 180))):
            Circle(SKETCH8_R)
        with Locations(Location((8.5, 0, 0), (0, 0, 180))):
            Circle(SKETCH8_R)
        with Locations(Location((10.5, 0, 0), (0, 0, 180))):
            Circle(SKETCH8_R)
        with Locations(Location((12.5, 0, 0), (0, 0, 180))):
            Circle(SKETCH8_R)
        with Locations(Location((14.5, 0, 0), (0, 0, 180))):
            Circle(SKETCH8_R)
        with Locations((16.5, 0)):
            Circle(SKETCH8_R)
    extrude(amount=-CUT_EXTRUDE5_DEPTH, mode=Mode.SUBTRACT)


solid = part.part
